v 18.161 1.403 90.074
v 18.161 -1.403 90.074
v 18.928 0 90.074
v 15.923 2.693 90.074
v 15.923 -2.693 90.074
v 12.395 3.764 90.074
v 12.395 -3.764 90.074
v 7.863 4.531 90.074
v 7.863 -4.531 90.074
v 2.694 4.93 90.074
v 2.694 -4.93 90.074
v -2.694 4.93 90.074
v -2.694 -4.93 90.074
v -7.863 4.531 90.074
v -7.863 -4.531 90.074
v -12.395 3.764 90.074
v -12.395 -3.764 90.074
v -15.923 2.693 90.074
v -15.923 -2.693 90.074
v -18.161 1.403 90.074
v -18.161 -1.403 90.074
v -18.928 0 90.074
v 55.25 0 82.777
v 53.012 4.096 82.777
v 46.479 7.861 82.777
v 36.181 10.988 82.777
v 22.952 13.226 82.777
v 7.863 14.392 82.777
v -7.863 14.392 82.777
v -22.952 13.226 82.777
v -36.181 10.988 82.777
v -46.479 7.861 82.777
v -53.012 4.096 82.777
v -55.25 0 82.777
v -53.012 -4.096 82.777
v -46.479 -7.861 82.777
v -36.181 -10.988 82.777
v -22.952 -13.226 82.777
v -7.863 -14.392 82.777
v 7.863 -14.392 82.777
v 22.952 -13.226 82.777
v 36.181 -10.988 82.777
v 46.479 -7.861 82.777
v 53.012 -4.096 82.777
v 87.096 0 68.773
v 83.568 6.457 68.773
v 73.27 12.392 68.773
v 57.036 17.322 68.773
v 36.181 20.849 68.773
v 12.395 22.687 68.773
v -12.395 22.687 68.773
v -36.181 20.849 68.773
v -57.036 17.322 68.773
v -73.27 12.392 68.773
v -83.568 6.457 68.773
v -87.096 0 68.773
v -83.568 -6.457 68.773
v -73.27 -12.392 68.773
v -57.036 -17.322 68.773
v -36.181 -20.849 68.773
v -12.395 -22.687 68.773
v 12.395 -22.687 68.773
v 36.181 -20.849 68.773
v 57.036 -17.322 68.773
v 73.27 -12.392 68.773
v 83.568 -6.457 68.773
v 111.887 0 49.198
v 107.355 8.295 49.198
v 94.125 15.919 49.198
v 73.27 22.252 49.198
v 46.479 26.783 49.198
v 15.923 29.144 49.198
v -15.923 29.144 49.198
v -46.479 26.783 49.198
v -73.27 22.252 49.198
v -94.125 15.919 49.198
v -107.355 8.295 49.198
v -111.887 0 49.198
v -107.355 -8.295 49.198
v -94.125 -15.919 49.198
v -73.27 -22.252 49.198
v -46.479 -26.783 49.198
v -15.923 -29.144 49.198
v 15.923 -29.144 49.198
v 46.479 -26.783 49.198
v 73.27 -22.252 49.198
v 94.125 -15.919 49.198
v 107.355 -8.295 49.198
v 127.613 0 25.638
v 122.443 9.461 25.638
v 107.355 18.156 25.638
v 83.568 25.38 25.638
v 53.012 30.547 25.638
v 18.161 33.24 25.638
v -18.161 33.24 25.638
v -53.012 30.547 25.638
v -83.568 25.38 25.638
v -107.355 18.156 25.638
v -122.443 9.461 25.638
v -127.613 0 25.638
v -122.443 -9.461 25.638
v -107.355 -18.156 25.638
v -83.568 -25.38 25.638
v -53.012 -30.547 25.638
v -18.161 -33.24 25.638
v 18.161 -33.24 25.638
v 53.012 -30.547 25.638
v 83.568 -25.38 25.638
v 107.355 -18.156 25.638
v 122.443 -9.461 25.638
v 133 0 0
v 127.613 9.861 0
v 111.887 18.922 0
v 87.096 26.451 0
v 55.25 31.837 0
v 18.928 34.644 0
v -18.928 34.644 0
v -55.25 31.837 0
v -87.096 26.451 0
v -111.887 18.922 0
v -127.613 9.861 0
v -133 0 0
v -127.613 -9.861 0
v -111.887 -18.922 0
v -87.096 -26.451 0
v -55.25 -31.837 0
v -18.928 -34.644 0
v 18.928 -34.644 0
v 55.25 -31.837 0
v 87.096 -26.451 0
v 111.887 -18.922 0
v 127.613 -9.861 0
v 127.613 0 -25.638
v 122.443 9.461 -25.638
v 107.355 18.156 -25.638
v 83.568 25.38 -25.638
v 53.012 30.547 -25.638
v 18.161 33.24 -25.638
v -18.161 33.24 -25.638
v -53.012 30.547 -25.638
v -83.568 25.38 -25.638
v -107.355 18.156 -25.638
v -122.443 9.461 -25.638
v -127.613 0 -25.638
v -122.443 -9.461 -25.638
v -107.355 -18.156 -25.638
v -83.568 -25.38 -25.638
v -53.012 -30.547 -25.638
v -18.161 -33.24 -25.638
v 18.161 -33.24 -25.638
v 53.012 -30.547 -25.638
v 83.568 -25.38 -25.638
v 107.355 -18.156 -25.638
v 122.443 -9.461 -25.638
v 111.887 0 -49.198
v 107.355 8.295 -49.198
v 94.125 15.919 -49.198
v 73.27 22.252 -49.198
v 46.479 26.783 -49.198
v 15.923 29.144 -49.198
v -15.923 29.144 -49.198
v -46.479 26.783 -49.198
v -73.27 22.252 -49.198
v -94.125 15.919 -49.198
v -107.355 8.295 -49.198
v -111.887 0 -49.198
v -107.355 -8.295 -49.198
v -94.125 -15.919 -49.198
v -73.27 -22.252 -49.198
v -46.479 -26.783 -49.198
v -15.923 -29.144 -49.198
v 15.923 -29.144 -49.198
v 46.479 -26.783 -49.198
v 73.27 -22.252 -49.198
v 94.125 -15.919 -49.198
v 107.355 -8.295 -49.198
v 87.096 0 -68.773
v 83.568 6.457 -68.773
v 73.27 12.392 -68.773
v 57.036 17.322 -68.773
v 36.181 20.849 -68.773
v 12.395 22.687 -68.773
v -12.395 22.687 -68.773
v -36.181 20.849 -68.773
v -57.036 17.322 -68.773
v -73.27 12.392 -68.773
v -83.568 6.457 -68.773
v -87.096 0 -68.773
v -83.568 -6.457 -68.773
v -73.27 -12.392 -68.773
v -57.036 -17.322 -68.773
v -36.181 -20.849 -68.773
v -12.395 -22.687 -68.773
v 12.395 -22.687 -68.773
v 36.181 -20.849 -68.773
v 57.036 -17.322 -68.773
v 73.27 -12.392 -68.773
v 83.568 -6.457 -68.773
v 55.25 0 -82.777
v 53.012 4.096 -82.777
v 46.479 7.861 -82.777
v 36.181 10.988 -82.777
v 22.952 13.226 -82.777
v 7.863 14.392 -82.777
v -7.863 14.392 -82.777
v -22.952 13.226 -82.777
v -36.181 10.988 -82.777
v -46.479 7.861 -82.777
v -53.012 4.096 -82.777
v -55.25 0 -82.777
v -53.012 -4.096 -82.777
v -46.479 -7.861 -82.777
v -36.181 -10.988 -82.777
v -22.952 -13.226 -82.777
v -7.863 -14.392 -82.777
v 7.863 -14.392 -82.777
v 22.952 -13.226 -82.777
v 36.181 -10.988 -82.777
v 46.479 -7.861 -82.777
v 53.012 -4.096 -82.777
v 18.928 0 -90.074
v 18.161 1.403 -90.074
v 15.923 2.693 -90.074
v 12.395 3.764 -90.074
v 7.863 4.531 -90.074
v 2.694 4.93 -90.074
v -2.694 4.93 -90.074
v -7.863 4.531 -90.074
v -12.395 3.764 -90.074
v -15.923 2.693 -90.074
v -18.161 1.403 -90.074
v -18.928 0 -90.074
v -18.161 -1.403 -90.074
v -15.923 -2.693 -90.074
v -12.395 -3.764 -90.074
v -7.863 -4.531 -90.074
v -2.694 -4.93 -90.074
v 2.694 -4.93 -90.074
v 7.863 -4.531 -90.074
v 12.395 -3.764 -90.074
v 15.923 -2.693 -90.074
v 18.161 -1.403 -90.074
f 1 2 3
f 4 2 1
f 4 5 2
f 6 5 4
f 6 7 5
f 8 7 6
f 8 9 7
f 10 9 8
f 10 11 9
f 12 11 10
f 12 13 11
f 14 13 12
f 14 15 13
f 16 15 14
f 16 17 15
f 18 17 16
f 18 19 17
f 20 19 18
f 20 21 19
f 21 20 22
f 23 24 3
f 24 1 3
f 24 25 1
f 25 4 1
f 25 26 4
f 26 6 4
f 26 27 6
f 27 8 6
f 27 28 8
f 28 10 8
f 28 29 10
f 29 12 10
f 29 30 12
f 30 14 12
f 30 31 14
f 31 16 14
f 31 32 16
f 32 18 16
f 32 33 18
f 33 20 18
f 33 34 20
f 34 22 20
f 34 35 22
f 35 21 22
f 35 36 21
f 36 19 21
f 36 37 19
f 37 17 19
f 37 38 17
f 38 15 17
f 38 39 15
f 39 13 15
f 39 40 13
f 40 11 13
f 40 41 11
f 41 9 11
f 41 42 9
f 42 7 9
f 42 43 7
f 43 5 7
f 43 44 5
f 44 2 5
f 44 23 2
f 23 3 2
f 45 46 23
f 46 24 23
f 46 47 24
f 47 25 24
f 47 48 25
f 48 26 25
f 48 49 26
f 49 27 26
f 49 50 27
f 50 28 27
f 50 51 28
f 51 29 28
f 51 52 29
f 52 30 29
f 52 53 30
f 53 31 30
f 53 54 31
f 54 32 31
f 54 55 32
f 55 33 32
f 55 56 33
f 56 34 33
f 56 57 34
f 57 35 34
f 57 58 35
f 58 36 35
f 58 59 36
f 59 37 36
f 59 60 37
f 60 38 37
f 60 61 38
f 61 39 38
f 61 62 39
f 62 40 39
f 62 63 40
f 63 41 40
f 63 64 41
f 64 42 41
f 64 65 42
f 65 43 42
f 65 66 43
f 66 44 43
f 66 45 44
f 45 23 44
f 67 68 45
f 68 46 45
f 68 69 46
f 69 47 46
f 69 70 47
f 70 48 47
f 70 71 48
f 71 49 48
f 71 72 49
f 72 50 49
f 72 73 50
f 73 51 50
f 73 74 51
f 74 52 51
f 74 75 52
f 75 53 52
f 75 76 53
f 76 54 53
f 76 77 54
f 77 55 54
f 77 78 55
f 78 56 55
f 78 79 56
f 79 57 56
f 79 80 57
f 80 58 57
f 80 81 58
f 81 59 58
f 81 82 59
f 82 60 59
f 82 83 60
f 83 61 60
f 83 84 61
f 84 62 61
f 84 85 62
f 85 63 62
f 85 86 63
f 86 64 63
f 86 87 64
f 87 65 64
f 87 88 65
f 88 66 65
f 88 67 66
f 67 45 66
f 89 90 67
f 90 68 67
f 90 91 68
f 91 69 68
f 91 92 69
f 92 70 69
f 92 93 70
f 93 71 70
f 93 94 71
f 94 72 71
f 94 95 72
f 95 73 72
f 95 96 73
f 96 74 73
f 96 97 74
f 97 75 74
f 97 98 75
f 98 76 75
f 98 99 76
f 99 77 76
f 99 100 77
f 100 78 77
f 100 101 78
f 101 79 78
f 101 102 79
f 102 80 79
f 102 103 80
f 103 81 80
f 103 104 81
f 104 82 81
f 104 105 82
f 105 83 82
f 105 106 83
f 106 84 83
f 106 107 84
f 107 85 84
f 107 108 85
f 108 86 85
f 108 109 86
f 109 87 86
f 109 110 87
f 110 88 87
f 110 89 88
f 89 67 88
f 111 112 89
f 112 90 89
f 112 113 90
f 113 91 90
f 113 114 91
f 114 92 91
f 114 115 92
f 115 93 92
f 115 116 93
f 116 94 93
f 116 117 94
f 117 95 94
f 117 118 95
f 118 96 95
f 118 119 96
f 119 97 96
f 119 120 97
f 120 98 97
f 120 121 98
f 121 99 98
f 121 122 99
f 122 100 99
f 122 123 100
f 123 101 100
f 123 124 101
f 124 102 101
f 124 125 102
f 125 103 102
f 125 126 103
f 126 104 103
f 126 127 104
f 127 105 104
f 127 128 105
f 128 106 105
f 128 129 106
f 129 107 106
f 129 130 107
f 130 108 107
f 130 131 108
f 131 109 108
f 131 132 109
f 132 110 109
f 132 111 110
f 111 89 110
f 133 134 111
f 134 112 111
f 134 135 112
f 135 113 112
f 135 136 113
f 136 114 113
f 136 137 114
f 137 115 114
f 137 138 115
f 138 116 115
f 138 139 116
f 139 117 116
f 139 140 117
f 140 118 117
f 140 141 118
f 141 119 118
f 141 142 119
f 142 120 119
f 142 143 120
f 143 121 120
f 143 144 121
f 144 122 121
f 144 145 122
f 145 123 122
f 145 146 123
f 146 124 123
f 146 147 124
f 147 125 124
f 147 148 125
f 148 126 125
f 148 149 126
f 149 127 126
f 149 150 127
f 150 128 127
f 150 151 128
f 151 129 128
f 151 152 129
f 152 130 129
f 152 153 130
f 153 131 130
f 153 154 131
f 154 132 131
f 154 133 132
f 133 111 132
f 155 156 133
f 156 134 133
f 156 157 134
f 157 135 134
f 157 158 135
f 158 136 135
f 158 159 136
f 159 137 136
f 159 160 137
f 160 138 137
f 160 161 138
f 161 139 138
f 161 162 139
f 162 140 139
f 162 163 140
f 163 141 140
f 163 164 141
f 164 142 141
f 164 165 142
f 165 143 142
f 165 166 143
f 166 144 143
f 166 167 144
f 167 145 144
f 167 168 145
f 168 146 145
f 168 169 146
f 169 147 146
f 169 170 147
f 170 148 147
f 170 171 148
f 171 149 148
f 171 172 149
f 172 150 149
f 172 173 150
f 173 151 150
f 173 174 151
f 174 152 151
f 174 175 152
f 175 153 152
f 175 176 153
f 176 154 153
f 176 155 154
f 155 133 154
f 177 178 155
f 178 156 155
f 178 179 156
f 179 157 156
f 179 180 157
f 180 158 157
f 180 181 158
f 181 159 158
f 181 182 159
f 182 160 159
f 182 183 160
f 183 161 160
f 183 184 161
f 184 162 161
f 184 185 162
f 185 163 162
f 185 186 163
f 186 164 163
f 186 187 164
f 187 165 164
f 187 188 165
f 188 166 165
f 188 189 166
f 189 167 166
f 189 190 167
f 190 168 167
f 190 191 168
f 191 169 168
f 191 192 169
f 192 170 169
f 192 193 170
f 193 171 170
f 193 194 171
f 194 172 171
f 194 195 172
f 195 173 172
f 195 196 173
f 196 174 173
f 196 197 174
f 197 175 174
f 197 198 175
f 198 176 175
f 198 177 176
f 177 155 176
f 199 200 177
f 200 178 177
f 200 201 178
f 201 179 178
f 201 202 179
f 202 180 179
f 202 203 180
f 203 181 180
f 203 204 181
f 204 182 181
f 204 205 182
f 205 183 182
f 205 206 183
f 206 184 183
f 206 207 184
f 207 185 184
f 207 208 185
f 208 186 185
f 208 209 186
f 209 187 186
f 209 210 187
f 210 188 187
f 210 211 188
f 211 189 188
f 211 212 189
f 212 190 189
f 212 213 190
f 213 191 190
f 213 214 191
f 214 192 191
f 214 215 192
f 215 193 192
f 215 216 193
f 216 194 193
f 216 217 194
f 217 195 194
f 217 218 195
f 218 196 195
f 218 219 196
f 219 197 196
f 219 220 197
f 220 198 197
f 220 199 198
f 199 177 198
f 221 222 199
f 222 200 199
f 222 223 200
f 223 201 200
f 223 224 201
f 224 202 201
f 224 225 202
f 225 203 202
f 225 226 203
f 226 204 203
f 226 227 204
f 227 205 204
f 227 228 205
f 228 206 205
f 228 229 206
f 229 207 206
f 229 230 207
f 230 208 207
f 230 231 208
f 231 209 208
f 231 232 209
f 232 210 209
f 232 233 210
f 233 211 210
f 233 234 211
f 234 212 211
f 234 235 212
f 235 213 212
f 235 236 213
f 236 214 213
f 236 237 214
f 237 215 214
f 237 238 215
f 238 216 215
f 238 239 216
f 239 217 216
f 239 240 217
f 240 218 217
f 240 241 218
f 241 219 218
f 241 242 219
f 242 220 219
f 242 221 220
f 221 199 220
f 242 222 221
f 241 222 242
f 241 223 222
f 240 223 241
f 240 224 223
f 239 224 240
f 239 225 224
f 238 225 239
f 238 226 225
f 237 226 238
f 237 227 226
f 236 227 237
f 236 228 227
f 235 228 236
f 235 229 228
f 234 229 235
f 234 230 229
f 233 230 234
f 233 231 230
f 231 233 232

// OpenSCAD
// Generated by SolidPython 1.0.1 on 2020-07-29 00:46:53


scale(v = [19, 5, 13]) {
	sphere(r = 7);
}
/***********************************************
*********      SolidPython code:      **********
************************************************
 
# import packages: SolidPython
from solid import *
from solid.utils import *
from itertools import chain, combinations, permutations


class Resize:

    def __init__(self, scad_file):
        self.scad_file = scad_file
        #self.scad_file = import_scad(scad_file)
        # cone/cylinder param:
        self.r1 = 0
        self.r2 = 0
        self.h = 0
        # rectangular prism param:
        self.w = 0
        self.l = 0
        # ellipse param:
        self.r = 0

    # import OpenScad code (file name corresponds to shape)


    # classify shape + parameters
    def assign(self, param1, param2, param3):
        if self.scad_file == 'cone.scad':
            self.r1 = param1
            self.r2 = param2
            self.h = param3
        elif self.scad_file == 'cylinder.scad':
            self.r1 = param1
            self.r2 = param2
            self.h = param3
        elif self.scad_file == 'rectangularPrism.scad':
            self.h = param1
            self.l = param2
            self.w = param3
        else:
            self.r = param1
            self.h = param2

    # resize parameters
    def iterate(self):
        x = range(3, 20, 2)
        i = 1
        if self.scad_file == 'cone.scad':
            tempList = list(permutations(x, 2))
            for temp in tempList:
                param1 = temp[0]
                param2 = temp[1]
                filepath = 'produced_scad_files/' + 'cone' + str(param1) + '_' + str(param2) + '_' + '.scad'
                scad_render_to_file(cylinder(h=param1, r1=param2, r2=0), filepath)

        elif self.scad_file == 'cylinder.scad':
            tempList = list(permutations(x, 3))
            for temp in tempList:
                param1 = temp[0]
                param2 = temp[1]
                filepath = 'produced_scad_files/' + 'cylinder' + str(param1) + '_' + str(param2) + '_' + '.scad'
                scad_render_to_file(cylinder(h=param1, r1=param2, r2=param2), filepath)

        elif self.scad_file == 'rectangularPrism.scad':
            tempList = list(permutations(x, 3))
            for temp in tempList:
                param1 = temp[0]
                param2 = temp[1]
                param3 = temp[2]
                filepath = 'produced_scad_files/' + 'rectangularPrism' + str(param1) + '_' + str(param2) + '_' + str(
                    param3) + '.scad'
                scad_render_to_file(cube(size=(param1, param2, param3)), filepath)

        elif self.scad_file == 'ellipse.scad':
            tempList = list(permutations(x, 4))
            for temp in tempList:
                param1 = temp[0]
                param2 = temp[1]
                param3 = temp[2]
                param4 = temp[3]
                filepath = 'produced_scad_files/' + 'ellipse' + str(param1) + '_' + str(param2) + '_' + str(param3) + '_' + str(param4) + '.scad'
                scad_render_to_file(scale([param1, param2, param3])(sphere(r=param4)), filepath)

    def render_to_scadfile(self):
        scad_render_to_file(scad, 'example.scad') 
 
************************************************/
